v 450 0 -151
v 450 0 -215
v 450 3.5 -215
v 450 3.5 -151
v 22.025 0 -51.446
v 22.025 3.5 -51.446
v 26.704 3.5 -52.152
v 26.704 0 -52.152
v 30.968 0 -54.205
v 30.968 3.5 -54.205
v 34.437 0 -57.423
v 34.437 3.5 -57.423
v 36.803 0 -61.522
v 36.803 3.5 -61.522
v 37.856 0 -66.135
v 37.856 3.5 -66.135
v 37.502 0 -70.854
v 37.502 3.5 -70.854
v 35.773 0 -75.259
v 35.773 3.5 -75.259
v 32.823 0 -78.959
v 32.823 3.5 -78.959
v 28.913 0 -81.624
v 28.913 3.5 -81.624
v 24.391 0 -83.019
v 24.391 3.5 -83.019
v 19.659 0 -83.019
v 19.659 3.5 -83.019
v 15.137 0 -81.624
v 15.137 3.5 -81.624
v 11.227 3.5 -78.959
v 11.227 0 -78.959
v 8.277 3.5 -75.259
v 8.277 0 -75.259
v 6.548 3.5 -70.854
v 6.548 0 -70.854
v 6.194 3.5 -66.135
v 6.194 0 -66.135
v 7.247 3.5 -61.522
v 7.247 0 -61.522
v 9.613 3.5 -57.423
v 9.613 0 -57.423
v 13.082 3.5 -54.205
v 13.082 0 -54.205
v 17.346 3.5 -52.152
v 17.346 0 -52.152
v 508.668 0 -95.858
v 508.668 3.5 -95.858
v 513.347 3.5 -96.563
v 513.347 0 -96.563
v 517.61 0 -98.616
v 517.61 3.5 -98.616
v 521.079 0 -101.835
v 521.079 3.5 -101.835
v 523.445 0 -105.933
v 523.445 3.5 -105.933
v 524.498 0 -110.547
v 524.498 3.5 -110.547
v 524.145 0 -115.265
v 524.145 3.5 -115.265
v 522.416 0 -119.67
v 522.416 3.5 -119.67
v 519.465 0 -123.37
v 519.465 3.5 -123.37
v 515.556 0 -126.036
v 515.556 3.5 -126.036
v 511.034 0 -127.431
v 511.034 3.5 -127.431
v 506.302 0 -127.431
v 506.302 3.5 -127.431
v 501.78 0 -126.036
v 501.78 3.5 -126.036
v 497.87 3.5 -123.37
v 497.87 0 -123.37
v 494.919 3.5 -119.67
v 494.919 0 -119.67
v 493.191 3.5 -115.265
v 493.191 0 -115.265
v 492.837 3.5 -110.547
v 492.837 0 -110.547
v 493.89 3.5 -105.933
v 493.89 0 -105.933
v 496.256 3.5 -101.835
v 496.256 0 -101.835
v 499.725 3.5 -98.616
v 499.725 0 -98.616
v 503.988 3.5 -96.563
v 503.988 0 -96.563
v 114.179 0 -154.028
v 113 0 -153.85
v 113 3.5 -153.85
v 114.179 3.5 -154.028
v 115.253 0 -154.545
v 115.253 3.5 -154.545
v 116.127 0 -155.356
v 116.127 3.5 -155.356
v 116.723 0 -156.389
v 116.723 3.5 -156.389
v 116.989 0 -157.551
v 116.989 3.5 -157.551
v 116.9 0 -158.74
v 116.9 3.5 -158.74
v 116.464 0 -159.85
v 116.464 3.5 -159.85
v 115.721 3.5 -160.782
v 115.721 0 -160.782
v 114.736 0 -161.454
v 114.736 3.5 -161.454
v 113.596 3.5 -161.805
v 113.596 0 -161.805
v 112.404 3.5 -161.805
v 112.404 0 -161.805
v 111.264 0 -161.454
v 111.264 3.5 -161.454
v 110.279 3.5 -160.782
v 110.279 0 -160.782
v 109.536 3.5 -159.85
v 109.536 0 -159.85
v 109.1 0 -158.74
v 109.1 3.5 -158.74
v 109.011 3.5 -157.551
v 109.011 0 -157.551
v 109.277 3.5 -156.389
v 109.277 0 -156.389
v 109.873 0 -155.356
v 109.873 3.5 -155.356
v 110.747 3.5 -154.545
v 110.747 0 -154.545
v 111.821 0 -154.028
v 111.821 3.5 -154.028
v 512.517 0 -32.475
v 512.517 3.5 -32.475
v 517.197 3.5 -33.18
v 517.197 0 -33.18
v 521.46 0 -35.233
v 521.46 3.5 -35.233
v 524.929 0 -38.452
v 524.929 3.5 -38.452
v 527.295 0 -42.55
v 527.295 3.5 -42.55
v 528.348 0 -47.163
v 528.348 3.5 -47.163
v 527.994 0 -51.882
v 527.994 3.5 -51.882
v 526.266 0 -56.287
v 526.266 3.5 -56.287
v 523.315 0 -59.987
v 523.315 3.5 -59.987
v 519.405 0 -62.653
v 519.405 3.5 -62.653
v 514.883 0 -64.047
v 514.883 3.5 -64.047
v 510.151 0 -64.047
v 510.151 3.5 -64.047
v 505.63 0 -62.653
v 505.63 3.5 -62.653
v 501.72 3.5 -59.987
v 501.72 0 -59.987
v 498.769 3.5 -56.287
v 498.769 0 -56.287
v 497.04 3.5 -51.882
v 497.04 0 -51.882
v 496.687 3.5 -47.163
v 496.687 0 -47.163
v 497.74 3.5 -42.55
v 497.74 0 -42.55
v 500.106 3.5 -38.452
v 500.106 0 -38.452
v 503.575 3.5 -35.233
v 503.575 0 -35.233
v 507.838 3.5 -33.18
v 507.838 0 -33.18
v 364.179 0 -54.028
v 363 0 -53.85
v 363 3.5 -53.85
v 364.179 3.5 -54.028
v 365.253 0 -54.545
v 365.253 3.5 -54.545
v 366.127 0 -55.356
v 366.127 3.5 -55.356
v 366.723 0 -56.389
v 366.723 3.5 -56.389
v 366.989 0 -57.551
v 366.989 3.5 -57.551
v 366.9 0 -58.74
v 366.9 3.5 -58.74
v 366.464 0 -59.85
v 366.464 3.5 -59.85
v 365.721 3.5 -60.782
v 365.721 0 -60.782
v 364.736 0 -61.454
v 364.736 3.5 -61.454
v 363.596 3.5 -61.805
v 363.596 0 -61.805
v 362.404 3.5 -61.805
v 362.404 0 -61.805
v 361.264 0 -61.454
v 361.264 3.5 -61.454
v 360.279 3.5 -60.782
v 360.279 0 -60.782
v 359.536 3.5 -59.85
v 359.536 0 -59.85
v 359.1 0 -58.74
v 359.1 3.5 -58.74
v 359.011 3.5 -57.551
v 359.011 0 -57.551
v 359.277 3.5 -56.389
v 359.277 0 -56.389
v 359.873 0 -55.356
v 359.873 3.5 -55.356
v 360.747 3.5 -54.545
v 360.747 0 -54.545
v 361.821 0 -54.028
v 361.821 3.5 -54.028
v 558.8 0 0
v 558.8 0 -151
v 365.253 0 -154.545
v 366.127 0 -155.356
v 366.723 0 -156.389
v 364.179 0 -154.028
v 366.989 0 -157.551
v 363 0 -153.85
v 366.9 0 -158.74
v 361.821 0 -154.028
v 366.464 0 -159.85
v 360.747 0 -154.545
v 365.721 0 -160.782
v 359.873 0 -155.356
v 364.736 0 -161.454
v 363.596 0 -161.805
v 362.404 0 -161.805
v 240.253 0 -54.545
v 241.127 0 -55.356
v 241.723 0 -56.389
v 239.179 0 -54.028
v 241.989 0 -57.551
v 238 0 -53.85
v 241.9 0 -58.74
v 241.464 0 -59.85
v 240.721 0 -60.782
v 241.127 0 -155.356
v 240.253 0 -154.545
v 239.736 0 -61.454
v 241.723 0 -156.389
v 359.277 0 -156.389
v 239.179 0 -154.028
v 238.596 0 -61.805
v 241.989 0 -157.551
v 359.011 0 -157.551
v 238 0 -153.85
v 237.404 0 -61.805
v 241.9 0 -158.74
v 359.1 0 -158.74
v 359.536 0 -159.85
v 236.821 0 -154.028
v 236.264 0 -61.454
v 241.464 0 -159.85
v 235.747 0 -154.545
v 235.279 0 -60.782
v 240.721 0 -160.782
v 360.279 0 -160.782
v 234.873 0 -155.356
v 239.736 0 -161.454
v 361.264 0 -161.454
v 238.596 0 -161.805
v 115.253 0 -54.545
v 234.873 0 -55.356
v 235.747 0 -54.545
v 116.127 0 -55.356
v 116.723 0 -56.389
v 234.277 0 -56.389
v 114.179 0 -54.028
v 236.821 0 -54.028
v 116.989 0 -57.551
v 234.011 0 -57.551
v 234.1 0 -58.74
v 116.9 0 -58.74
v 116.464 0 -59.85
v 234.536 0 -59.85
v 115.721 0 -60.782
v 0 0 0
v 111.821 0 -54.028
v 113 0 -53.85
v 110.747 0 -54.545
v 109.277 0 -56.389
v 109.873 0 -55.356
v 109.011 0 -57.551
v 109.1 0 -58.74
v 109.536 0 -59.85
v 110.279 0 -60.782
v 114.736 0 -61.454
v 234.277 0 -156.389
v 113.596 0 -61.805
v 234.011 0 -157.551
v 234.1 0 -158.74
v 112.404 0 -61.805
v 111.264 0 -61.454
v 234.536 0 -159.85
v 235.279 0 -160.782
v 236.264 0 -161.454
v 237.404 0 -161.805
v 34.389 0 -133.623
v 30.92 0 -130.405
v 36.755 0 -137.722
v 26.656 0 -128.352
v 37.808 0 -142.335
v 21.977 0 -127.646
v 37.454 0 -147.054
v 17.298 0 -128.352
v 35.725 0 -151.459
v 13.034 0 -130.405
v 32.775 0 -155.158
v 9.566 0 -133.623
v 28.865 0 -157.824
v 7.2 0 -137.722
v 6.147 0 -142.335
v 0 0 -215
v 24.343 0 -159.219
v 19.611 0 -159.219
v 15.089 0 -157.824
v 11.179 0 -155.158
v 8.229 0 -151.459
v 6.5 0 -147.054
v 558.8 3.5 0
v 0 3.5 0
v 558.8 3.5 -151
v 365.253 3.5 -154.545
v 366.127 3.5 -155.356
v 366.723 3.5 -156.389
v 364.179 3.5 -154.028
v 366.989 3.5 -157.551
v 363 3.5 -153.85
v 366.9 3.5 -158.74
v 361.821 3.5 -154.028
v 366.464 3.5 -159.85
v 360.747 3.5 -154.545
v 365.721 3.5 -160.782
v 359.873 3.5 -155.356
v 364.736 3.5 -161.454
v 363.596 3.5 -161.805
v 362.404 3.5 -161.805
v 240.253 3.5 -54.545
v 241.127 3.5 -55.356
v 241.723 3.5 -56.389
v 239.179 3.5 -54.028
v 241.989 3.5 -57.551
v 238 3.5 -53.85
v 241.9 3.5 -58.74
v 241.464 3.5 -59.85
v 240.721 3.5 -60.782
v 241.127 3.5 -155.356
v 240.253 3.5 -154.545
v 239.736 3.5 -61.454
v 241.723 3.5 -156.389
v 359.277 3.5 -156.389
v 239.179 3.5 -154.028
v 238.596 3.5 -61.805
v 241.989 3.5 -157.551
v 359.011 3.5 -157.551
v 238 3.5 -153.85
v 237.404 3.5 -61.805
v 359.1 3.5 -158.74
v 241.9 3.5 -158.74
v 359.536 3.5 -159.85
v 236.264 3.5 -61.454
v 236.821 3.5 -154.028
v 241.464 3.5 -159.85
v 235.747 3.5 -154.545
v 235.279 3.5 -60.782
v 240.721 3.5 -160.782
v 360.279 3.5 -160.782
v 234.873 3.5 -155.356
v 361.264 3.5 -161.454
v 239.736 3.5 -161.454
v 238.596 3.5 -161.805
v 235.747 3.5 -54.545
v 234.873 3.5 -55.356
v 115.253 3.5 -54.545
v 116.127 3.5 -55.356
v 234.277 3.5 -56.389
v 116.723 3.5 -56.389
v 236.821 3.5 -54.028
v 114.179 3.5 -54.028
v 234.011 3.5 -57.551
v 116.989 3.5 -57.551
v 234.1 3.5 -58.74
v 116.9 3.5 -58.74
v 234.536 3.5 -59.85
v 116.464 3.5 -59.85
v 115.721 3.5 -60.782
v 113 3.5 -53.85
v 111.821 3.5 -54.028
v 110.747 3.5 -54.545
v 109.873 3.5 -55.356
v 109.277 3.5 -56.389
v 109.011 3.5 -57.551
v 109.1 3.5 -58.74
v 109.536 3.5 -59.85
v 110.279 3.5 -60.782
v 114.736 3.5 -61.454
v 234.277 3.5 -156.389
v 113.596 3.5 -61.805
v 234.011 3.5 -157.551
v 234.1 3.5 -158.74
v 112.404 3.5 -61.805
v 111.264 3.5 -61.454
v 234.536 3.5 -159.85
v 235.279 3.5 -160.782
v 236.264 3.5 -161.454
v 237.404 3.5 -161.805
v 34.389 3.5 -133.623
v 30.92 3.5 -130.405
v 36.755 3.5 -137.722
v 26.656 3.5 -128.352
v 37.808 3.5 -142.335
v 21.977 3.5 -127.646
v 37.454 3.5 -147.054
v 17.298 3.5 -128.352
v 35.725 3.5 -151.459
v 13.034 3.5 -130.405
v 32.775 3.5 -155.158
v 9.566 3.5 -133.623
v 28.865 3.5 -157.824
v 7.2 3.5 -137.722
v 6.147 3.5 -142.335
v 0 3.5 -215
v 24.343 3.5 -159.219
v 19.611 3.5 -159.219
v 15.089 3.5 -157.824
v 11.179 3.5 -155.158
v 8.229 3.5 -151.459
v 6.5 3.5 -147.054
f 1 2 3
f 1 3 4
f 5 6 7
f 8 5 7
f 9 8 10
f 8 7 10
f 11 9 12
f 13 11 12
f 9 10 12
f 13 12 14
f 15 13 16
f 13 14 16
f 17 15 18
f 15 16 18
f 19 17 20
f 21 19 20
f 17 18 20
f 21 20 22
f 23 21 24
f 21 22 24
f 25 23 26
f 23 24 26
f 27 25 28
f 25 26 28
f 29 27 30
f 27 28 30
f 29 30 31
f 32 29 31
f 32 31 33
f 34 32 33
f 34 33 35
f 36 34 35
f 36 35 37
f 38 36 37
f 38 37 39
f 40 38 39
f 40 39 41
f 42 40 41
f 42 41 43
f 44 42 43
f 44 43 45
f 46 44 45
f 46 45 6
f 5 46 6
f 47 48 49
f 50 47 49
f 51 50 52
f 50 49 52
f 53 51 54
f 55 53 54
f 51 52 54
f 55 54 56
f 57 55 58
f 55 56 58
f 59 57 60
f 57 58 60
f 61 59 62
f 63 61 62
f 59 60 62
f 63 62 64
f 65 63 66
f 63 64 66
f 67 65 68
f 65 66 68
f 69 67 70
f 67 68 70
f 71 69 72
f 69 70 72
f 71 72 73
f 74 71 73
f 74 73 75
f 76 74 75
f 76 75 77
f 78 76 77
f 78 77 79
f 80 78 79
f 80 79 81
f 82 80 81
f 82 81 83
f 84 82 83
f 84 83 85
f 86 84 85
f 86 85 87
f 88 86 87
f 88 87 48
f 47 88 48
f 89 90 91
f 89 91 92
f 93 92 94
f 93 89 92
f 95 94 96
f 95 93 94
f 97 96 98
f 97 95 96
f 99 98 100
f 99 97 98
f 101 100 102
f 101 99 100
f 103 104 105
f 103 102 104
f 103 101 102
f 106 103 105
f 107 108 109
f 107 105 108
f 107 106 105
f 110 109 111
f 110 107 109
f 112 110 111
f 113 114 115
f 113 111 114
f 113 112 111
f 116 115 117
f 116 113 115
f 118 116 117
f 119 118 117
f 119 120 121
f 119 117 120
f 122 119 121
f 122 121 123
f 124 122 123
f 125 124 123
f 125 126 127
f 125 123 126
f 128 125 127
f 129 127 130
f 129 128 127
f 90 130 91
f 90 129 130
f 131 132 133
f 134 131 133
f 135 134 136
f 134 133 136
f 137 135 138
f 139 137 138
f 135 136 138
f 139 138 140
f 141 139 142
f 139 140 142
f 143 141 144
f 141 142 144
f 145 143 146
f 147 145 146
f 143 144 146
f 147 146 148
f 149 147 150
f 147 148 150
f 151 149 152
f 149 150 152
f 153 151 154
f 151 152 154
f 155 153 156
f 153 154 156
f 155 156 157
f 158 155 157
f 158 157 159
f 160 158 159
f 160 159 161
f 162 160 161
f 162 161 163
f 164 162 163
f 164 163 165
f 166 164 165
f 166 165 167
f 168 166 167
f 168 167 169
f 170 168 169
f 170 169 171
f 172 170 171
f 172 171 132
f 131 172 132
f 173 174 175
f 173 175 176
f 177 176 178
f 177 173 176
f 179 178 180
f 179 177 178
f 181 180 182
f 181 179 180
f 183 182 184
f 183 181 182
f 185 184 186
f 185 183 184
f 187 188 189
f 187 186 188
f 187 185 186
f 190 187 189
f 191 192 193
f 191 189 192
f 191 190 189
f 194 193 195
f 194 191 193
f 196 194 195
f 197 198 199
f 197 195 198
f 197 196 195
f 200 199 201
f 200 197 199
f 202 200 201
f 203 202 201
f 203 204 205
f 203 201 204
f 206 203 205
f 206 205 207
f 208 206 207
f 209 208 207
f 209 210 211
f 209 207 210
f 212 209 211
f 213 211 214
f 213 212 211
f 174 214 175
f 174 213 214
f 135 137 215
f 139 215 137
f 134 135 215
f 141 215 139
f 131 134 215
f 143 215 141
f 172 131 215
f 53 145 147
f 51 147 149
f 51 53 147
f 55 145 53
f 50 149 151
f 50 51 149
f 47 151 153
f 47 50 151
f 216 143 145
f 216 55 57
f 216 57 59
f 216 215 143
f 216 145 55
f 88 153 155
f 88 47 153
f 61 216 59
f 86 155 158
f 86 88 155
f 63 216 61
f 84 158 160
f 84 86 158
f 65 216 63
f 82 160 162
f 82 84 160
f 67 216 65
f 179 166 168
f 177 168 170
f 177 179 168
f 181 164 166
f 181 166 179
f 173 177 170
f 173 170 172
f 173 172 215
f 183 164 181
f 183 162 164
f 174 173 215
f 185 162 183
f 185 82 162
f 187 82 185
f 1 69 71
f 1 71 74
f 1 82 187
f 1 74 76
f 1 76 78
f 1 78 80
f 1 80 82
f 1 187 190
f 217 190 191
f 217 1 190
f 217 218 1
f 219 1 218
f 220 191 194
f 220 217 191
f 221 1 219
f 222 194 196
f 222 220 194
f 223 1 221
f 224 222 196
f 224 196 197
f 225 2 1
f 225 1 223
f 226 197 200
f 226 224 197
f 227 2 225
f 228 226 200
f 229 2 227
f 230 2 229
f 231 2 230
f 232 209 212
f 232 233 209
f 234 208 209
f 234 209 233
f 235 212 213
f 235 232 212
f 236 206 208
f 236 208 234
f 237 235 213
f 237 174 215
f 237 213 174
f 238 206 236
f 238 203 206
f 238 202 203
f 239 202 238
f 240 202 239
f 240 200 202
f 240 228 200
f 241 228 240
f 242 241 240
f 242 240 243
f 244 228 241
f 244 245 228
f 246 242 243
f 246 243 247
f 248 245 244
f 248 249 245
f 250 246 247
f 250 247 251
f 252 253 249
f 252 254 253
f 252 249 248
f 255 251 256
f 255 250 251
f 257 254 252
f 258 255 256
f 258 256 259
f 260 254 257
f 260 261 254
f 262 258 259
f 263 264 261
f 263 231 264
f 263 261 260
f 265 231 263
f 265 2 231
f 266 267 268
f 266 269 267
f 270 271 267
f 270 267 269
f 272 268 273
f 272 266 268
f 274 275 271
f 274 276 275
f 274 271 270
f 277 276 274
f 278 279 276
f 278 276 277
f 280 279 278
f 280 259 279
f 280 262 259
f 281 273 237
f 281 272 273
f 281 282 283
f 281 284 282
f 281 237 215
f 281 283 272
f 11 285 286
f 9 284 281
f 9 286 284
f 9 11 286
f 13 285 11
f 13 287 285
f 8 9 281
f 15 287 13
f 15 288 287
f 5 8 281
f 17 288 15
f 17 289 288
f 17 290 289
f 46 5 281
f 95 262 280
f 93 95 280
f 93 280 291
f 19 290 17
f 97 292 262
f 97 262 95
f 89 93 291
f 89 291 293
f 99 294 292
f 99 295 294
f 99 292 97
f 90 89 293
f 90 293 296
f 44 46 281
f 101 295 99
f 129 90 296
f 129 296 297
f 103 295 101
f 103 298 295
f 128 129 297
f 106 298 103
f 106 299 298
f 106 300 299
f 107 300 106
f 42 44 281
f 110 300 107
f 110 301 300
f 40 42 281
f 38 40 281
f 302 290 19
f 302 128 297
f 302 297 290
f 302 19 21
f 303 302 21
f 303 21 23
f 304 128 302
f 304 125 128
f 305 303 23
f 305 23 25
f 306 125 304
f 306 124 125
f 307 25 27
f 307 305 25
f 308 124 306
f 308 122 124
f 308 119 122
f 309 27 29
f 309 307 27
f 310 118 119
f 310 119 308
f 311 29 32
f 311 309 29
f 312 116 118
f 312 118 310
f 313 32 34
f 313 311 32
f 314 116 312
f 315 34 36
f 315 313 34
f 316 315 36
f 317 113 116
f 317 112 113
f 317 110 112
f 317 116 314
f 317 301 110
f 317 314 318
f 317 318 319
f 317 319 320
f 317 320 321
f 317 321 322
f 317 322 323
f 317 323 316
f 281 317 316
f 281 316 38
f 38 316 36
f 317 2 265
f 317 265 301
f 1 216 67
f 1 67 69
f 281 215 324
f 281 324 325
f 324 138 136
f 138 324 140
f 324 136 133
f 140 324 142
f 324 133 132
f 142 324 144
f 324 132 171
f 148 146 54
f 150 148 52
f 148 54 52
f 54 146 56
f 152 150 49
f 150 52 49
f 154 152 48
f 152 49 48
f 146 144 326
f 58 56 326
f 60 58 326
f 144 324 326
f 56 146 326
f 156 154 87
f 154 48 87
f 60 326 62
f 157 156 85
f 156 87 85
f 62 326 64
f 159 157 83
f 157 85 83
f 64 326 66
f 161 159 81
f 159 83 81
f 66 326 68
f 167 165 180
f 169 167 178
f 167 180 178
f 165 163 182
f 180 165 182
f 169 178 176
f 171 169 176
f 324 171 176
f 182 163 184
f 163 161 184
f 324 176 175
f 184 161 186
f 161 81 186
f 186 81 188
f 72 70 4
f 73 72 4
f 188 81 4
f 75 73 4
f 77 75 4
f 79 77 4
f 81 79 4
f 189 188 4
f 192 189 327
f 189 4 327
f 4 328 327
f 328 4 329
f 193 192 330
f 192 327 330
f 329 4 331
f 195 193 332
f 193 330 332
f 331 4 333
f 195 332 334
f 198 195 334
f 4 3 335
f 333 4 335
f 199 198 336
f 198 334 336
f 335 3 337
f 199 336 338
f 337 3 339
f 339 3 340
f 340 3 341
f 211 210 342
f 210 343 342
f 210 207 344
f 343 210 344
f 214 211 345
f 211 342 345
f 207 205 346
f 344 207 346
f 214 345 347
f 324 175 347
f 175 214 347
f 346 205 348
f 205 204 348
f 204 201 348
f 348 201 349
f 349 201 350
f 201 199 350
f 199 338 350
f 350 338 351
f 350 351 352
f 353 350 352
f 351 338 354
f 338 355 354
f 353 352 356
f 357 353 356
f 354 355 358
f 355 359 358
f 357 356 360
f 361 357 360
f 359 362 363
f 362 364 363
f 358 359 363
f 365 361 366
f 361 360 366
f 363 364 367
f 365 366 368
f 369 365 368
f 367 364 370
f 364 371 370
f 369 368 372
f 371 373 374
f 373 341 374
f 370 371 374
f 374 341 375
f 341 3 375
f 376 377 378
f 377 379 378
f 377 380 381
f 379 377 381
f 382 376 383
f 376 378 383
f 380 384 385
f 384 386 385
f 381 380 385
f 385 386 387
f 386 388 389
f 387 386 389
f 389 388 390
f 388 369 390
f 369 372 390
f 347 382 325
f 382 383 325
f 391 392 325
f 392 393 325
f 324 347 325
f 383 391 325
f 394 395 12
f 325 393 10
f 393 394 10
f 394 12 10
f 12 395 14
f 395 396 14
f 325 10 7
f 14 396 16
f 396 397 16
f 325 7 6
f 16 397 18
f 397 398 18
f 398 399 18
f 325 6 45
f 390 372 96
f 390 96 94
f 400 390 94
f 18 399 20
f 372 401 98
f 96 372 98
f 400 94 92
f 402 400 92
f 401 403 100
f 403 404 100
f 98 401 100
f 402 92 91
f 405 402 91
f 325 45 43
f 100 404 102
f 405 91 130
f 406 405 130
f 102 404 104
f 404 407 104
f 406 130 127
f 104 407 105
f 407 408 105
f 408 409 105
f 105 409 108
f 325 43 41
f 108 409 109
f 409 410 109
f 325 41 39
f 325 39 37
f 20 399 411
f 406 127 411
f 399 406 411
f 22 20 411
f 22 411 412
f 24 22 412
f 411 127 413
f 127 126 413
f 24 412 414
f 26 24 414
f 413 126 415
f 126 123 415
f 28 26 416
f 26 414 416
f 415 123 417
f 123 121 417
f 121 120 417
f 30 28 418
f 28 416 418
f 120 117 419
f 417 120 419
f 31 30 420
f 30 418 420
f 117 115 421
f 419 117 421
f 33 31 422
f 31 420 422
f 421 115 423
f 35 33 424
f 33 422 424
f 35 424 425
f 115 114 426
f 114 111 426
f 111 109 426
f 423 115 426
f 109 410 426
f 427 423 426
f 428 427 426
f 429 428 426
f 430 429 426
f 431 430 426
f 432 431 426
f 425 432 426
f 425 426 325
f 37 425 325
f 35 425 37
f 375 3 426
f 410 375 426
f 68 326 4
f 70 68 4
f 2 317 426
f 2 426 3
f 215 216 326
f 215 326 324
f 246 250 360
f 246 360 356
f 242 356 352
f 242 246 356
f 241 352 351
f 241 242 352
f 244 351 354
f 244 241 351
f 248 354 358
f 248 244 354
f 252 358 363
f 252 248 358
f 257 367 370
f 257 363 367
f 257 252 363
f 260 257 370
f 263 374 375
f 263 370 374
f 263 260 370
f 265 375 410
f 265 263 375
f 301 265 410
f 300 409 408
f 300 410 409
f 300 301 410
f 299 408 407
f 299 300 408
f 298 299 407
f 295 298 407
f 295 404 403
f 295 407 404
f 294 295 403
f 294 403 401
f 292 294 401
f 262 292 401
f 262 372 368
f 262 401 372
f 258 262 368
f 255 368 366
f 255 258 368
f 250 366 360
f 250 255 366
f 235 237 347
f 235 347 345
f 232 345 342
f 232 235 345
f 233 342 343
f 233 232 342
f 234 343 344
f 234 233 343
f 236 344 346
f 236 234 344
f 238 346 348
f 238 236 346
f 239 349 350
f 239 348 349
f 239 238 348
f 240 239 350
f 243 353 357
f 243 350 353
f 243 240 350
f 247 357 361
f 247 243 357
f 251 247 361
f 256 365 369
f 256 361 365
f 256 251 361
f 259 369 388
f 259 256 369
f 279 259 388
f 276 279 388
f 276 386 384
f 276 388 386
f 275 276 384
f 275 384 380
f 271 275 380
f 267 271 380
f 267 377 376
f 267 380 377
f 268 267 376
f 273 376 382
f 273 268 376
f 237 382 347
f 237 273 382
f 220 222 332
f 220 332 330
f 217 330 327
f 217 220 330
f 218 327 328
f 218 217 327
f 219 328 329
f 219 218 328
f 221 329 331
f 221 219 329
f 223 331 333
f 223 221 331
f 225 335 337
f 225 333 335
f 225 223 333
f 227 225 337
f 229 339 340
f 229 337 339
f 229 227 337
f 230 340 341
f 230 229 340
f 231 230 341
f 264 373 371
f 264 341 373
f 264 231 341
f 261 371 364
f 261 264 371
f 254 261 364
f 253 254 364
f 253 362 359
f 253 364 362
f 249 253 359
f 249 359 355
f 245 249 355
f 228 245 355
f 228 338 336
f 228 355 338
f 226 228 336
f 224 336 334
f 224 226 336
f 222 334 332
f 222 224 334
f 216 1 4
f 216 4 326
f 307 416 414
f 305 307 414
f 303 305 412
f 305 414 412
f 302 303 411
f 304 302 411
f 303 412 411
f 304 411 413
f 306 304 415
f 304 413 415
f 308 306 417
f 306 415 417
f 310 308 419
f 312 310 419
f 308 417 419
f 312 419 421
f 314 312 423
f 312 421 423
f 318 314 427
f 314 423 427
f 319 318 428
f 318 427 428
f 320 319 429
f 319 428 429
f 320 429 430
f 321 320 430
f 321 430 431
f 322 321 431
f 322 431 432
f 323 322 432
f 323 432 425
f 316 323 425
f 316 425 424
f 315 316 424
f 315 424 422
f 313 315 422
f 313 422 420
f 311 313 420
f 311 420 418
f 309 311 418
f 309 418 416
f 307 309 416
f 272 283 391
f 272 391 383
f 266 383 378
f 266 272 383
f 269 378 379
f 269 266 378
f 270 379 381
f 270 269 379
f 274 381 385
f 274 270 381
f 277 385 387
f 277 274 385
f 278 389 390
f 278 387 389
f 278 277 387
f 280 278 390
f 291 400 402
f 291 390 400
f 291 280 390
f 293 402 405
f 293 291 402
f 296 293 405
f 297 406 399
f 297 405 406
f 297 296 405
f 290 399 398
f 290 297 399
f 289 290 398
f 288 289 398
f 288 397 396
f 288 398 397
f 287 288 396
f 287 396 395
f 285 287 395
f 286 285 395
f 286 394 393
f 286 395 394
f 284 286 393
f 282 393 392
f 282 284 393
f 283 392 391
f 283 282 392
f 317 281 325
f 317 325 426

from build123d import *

# Parameters (mm, degrees)
BOSS_EXTRUDE1_DEPTH     = 3.5
CUT_EXTRUDE1_DEPTH      = 599.744260933
CUT_EXTRUDE1_DEPTH_BACK = 599.744260933
SKETCH2_R               = 4
SKETCH3_R               = 15.875
CUT_EXTRUDE2_DEPTH      = 10


with BuildPart() as part:
    # Sketch1 → Boss-Extrude1 (new body)
    with BuildSketch(Plane(origin=(0, 0, 0), x_dir=(1, 0, 0), z_dir=(0, 1, 0))):
        Polygon((0, 0), (0, 215), (450, 215), (450, 151), (558.8, 151), (558.8, 0), align=None)
    extrude(amount=BOSS_EXTRUDE1_DEPTH)

    # Sketch2 → Cut-Extrude1 (cut, two sides: drawn at the far end of the back side and taken through both)
    with BuildSketch(Plane(origin=(0, 3.5, 0), x_dir=(1, 0, 0), z_dir=(0, 1, 0)).offset(-CUT_EXTRUDE1_DEPTH_BACK)):
        with Locations((113, 157.85)):
            Circle(SKETCH2_R)
        with Locations((238, 157.85)):
            Circle(SKETCH2_R)
        with Locations((363, 157.85)):
            Circle(SKETCH2_R)
        with Locations((363, 57.85)):
            Circle(SKETCH2_R)
        with Locations((238, 57.85)):
            Circle(SKETCH2_R)
        with Locations((113, 57.85)):
            Circle(SKETCH2_R)
    extrude(amount=CUT_EXTRUDE1_DEPTH + CUT_EXTRUDE1_DEPTH_BACK, mode=Mode.SUBTRACT)

    # Sketch3 → Cut-Extrude2 (cut)
    with BuildSketch(Plane(origin=(0, 3.5, 0), x_dir=(1, 0, 0), z_dir=(0, 1, 0))):
        with Locations((21.977158482, 143.521297983)):
            Circle(SKETCH3_R)
        with Locations((22.025, 67.321313002)):
            Circle(SKETCH3_R)
        with Locations((512.5174446, 48.349661731)):
            Circle(SKETCH3_R)
        with Locations((508.667649246, 111.732854107)):
            Circle(SKETCH3_R)
    extrude(amount=-CUT_EXTRUDE2_DEPTH, mode=Mode.SUBTRACT)


solid = part.part
